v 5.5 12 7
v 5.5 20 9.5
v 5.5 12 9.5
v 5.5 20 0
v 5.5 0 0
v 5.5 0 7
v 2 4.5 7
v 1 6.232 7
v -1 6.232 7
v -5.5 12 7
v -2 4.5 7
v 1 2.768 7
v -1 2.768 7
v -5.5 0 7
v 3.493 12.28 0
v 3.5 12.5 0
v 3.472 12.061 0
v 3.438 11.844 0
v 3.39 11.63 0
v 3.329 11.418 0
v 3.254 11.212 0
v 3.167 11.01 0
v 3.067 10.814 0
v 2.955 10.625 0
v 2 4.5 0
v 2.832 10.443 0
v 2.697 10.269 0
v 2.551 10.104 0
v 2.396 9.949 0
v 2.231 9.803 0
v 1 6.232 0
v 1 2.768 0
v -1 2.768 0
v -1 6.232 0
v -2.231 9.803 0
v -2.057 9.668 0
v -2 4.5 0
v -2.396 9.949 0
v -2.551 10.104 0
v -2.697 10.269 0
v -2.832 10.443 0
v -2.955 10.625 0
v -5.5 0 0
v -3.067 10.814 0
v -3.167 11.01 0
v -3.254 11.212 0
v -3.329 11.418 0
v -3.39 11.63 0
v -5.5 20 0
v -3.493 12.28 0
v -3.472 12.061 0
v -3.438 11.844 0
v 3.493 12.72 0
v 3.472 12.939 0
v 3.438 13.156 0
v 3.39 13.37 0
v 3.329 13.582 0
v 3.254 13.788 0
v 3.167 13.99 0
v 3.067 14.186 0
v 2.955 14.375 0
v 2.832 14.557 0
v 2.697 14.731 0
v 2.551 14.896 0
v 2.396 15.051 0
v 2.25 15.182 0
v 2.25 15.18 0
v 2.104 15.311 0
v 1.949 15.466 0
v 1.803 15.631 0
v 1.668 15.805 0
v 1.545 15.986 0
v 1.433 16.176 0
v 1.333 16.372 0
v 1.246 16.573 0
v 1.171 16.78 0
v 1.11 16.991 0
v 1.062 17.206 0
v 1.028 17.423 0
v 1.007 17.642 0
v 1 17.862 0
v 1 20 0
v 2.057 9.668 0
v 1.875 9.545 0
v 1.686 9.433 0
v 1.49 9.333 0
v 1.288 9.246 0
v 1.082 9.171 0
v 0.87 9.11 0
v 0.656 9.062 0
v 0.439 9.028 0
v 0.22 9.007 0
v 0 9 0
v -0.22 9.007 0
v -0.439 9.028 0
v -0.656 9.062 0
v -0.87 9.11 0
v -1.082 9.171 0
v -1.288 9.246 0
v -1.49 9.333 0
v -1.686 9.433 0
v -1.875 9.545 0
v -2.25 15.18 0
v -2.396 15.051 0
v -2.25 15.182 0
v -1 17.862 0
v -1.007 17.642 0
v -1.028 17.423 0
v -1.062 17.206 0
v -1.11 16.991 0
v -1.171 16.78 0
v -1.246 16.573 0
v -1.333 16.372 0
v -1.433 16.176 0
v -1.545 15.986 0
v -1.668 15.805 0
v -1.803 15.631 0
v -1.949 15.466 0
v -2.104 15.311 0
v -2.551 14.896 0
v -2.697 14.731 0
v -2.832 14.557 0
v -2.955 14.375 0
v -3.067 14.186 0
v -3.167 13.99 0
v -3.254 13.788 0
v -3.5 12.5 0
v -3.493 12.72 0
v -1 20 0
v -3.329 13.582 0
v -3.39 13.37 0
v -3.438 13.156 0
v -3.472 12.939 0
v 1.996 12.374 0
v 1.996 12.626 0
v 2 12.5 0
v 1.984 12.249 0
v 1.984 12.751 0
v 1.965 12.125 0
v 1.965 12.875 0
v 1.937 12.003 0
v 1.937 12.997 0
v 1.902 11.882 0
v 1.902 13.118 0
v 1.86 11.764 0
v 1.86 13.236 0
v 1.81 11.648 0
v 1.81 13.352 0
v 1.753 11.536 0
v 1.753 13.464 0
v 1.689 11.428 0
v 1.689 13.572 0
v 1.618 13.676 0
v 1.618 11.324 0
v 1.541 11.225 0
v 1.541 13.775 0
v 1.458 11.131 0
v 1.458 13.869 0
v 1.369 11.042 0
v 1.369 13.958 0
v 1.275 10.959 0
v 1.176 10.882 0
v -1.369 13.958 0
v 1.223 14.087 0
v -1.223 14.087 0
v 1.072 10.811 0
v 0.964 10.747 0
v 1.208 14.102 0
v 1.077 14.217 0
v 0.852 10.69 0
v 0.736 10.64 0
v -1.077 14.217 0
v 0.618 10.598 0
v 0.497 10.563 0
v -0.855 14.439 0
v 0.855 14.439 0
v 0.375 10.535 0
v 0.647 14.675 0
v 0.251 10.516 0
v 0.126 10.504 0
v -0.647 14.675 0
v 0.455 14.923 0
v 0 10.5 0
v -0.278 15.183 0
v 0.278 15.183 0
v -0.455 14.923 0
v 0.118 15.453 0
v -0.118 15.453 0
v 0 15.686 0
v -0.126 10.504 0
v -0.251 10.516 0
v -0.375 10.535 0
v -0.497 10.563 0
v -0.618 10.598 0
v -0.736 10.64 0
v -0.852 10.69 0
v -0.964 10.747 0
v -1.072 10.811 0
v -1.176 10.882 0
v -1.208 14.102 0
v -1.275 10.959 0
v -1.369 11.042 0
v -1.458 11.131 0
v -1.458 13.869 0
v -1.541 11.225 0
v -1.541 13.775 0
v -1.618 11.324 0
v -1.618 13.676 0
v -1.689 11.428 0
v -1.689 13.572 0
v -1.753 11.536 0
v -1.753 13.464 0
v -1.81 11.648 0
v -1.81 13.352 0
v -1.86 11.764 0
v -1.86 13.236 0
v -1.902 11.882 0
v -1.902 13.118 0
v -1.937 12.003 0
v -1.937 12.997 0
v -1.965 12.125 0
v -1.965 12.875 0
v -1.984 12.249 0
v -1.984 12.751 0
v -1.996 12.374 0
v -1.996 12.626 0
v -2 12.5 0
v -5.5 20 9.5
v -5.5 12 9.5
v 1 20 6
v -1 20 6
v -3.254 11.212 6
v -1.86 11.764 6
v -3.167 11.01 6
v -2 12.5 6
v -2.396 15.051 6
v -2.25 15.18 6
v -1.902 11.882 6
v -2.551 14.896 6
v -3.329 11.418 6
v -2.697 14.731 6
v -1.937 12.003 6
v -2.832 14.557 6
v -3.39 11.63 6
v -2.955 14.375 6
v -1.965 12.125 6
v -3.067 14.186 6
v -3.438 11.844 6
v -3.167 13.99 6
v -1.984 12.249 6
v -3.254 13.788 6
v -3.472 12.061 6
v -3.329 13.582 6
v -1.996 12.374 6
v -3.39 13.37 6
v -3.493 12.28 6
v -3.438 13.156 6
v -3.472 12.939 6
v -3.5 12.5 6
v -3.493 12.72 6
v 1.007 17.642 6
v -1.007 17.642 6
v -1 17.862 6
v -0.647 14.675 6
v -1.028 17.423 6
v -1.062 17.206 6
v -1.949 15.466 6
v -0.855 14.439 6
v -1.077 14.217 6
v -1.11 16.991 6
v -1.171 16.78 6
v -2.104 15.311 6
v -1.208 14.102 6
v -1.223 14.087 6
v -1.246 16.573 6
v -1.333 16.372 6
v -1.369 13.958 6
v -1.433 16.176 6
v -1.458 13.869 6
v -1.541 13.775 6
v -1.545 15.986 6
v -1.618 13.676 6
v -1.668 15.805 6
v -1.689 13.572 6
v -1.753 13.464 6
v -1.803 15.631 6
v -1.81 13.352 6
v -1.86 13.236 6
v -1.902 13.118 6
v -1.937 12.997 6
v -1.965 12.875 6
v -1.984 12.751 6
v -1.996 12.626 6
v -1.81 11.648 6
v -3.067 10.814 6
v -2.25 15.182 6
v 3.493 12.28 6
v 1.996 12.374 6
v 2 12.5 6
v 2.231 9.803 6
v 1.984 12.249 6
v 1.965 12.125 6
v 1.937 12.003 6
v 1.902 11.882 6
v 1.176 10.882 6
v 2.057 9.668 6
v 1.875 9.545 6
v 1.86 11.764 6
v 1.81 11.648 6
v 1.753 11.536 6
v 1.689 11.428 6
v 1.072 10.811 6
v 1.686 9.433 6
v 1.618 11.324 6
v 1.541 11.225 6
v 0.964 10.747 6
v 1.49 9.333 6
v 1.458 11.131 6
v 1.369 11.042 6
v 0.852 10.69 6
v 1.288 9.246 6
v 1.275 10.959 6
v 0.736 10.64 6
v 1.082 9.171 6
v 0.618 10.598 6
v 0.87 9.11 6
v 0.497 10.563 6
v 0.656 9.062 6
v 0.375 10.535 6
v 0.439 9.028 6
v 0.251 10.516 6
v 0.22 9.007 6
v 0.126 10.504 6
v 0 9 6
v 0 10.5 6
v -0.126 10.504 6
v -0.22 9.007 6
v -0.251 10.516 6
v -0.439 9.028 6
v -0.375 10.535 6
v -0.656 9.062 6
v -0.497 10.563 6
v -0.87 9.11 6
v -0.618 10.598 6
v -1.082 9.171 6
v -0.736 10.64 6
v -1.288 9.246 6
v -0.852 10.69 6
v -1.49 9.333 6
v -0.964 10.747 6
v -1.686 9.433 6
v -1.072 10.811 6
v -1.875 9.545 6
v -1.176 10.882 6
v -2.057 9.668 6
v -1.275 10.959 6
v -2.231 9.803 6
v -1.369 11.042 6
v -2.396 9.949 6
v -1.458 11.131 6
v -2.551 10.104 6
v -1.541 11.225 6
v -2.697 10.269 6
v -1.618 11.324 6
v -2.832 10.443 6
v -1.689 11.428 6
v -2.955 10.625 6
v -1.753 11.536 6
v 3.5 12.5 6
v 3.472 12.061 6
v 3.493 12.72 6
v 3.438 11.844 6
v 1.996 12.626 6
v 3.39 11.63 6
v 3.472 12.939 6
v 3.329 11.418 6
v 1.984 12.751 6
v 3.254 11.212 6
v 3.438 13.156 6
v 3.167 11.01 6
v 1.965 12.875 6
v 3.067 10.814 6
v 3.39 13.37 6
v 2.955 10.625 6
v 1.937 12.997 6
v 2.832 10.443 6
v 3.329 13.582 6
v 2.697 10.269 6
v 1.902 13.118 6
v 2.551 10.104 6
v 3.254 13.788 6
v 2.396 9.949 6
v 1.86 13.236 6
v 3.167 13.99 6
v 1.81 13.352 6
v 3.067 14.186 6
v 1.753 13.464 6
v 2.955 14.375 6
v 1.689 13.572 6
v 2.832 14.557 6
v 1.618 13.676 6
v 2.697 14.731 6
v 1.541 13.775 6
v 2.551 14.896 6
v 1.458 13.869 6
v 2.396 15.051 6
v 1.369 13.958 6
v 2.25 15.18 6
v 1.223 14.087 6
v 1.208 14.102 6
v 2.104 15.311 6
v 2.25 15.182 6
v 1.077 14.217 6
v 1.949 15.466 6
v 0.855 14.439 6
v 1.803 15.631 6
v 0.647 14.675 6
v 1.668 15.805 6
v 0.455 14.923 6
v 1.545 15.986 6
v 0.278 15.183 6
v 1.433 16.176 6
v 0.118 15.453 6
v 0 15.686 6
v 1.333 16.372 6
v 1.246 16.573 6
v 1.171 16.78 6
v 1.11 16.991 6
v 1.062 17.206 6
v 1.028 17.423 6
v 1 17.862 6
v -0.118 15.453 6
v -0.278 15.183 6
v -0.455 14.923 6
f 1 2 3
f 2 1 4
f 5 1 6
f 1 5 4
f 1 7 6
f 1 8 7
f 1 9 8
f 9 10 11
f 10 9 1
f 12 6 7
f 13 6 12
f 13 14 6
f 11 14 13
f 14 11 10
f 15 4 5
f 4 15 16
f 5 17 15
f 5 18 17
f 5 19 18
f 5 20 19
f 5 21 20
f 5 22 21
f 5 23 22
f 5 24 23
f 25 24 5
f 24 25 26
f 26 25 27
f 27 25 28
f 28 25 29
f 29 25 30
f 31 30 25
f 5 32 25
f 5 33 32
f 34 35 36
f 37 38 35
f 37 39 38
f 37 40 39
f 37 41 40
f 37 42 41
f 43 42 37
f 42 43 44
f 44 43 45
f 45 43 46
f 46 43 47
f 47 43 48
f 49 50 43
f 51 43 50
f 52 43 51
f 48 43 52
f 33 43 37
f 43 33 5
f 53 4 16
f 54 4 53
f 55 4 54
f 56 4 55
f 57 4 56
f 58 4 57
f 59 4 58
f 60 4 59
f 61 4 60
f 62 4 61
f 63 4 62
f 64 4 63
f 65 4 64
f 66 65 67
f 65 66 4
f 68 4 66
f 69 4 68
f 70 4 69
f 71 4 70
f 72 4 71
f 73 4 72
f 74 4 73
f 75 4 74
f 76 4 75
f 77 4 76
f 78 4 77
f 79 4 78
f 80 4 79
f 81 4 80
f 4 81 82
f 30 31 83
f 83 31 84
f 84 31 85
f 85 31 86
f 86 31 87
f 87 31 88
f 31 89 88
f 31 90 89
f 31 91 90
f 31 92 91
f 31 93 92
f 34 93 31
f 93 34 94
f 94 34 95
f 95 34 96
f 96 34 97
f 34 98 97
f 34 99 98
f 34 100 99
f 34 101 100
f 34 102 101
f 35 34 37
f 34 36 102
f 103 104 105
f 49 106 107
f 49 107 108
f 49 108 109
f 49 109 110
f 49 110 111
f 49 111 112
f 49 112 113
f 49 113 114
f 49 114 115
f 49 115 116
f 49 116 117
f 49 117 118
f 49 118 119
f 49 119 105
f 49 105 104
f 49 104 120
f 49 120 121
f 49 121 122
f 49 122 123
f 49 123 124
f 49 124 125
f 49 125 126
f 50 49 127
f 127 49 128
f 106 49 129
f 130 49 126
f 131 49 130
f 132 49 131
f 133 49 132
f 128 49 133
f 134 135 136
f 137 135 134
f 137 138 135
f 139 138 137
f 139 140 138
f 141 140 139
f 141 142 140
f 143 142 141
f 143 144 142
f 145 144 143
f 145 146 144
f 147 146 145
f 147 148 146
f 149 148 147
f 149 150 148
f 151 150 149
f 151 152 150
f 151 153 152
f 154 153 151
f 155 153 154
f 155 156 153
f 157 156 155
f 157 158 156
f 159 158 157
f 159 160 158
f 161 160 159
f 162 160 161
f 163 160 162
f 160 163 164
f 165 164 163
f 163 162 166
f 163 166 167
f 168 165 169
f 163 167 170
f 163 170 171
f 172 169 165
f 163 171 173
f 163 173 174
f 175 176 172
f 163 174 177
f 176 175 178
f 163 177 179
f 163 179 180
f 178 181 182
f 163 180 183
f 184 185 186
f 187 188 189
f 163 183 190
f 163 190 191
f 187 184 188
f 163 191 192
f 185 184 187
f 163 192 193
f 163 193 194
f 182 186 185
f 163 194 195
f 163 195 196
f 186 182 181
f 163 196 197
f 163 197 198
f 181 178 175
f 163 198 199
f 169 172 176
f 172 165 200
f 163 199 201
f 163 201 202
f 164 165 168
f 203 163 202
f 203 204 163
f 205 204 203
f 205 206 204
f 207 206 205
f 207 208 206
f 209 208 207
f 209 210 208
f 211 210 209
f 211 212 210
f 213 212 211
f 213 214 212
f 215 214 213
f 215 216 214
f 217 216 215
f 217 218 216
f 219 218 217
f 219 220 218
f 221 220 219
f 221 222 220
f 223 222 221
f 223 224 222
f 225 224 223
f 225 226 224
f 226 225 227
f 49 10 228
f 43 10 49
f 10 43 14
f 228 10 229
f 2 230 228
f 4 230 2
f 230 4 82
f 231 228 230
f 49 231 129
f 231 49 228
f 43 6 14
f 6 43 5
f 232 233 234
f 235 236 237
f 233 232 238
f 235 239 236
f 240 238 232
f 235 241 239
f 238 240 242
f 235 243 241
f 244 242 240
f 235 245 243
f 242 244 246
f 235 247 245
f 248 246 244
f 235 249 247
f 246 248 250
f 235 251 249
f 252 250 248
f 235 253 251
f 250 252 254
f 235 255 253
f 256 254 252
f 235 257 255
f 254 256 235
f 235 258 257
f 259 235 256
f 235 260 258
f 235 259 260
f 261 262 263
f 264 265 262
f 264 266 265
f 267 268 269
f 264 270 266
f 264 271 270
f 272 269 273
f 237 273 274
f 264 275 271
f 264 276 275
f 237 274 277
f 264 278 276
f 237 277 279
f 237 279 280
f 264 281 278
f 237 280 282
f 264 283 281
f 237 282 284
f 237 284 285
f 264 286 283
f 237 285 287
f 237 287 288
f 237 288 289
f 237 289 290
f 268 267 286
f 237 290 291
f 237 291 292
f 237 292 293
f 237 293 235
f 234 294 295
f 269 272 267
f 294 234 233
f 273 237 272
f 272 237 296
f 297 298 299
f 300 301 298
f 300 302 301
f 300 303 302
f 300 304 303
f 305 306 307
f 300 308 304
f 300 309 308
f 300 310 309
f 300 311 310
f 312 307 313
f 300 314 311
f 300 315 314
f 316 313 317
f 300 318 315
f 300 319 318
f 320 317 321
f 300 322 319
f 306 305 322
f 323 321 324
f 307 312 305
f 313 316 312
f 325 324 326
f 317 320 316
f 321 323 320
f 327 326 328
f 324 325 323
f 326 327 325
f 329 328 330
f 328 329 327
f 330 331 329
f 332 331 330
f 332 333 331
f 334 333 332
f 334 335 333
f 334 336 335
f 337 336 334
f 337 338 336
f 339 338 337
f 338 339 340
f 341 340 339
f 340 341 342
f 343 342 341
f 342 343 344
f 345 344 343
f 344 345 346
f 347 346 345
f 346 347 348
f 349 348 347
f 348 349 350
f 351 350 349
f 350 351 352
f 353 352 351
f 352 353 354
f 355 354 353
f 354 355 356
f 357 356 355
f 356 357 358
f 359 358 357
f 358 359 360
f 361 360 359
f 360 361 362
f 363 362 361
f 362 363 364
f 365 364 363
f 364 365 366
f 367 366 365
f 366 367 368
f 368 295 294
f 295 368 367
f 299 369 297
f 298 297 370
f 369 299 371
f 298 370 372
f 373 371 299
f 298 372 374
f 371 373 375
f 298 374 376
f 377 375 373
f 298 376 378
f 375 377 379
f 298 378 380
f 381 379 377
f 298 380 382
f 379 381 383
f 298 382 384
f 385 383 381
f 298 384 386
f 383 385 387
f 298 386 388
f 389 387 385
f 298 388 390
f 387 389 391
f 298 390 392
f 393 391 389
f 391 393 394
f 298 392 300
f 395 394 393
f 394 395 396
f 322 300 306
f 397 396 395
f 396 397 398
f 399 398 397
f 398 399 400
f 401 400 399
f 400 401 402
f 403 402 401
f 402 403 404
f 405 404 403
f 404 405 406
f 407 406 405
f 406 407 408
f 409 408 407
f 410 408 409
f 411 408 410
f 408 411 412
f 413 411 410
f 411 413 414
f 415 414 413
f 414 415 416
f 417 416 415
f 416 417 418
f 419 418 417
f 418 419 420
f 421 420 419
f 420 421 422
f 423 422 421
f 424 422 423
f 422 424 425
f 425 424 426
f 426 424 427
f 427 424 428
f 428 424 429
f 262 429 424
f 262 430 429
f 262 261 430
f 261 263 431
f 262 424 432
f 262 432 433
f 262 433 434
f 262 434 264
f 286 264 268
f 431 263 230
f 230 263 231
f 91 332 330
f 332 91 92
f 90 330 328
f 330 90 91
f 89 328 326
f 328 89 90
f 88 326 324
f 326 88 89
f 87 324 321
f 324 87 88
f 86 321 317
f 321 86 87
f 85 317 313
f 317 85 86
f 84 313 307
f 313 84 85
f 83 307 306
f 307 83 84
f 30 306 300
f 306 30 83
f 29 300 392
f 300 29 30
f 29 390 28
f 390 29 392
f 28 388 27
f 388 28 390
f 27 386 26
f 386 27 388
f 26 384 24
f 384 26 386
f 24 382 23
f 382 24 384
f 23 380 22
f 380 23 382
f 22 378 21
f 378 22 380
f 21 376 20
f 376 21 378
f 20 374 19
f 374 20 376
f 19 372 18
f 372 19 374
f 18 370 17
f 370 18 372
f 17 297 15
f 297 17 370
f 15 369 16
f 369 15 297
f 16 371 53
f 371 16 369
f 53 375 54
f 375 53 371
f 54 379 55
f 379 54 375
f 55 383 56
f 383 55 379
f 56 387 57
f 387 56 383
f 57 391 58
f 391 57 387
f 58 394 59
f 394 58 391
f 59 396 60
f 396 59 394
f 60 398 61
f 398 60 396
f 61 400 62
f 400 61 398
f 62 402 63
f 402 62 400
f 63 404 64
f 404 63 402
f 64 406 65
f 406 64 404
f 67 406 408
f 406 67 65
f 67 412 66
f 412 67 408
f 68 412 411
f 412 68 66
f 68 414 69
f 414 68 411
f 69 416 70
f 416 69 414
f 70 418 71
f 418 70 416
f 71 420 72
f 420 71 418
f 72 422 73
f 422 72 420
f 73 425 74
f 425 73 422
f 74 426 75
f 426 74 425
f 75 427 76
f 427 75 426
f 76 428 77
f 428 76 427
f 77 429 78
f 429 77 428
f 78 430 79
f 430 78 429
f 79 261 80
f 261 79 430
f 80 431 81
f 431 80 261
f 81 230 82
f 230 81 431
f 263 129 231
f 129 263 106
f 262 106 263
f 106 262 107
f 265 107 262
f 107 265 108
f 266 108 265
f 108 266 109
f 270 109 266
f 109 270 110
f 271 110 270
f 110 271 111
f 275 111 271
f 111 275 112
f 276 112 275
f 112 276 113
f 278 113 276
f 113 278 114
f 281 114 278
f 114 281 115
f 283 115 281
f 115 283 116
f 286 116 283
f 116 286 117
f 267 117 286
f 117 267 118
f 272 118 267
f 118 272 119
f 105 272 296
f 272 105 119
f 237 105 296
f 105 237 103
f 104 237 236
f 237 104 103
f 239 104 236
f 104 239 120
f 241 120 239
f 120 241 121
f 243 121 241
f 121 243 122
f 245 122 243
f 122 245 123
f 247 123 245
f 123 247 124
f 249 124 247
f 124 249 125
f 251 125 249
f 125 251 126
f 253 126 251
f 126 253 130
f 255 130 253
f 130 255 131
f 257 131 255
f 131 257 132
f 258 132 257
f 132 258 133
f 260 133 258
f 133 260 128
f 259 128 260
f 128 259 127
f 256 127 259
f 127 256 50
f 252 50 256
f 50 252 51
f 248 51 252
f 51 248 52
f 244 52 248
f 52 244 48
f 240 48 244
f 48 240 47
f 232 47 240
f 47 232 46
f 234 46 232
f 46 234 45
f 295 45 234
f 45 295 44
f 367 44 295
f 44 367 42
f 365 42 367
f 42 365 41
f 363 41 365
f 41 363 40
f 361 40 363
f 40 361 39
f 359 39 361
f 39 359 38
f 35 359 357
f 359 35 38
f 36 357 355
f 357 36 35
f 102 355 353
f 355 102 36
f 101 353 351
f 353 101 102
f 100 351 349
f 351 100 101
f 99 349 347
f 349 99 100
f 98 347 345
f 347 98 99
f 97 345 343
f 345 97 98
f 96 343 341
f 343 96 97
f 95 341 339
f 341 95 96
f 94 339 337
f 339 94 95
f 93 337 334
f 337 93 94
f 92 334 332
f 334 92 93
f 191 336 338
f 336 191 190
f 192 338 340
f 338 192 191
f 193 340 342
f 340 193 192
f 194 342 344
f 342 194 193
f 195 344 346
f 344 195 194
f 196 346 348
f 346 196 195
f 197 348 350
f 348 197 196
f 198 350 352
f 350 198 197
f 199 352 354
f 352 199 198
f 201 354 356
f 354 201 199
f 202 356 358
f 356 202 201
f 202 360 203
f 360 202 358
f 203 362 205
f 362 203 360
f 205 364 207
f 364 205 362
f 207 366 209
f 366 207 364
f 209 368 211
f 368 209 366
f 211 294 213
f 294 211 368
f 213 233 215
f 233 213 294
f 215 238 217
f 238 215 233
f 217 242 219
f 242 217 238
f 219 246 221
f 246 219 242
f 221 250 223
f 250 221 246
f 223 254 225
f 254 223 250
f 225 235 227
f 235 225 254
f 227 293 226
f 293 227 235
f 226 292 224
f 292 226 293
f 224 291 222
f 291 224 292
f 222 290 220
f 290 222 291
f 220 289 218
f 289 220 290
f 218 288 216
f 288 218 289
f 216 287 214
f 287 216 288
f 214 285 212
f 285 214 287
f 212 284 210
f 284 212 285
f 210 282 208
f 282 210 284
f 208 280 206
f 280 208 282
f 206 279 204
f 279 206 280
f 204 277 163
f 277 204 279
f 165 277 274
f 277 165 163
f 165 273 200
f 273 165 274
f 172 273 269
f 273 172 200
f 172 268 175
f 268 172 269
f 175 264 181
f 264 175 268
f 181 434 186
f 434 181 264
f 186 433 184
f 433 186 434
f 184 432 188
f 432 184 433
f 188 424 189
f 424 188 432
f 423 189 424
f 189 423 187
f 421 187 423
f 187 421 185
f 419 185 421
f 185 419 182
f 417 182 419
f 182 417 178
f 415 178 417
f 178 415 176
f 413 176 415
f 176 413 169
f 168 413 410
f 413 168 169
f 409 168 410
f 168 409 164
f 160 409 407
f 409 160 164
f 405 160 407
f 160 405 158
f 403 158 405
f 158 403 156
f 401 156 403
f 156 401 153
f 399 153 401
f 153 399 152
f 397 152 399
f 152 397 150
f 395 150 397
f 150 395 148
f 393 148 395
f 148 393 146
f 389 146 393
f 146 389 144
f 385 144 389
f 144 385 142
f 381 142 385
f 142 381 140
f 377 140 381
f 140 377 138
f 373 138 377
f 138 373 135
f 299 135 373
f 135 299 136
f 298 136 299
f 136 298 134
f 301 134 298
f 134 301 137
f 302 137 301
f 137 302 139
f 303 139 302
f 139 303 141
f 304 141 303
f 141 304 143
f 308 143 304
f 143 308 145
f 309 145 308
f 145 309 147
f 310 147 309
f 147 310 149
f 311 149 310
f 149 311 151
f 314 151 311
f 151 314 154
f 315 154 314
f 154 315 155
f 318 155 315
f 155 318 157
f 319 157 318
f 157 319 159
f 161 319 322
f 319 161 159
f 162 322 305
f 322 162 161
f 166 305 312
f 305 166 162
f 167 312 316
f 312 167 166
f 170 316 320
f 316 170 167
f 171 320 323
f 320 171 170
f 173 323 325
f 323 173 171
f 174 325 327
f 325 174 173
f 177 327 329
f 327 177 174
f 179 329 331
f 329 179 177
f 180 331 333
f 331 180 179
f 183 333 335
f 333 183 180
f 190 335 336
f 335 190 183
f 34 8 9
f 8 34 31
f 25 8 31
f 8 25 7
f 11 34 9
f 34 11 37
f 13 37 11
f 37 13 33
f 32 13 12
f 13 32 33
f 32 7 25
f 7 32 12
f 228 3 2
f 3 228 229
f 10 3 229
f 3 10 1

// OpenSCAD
$fn=100;

width=11;
length=20;

belt_thickness=1.5; // 1.38
merged_belt_thickness=2;
belt_width=6;
circle_d=7;

main(7, 2.5);
//main(8, 8.5);

module main(height1, height2) {
    difference() {
        translate([-width/2, 0, 0]) cube([width, length, height1]);
        translate([0, 12.5, 0]) belt();
        translate([0, 4.5, 0]) cylinder(d=4, h=99, $fn=6);
    }
    translate([-width/2, length-8, height1]) cube([width, 8, height2]);
}


module belt() {
    magic_width=circle_d/2+merged_belt_thickness/2;
    magic_height=sqrt(pow(circle_d, 2)-pow(magic_width, 2));
    linear_extrude(height=belt_width) shell(-1.5) {
        difference() {
            union() {
                circle(d=circle_d);
                translate([-(magic_width)/2, 0]) square([magic_width, magic_height]);
            }
            translate([magic_width, magic_height]) circle(d=circle_d);
            mirror([1, 0]) translate([magic_width, magic_height]) circle(d=circle_d);
        }
        translate([-merged_belt_thickness/2, 0]) square([merged_belt_thickness, 10]);
    }
}


// Copyright (c) 2013 Oskar Linde. All rights reserved.
// License: BSD
//
// This library contains basic 2D morphology operations
//
// outset(d=1)            - creates a polygon at an offset d outside a 2D shape
// inset(d=1)             - creates a polygon at an offset d inside a 2D shape
// fillet(r=1)            - adds fillets of radius r to all concave corners of a 2D shape
// rounding(r=1)          - adds rounding to all convex corners of a 2D shape
// shell(d,center=false)  - makes a shell of width d along the edge of a 2D shape
//                        - positive values of d places the shell on the outside
//                        - negative values of d places the shell on the inside
//                        - center=true and positive d places the shell centered on the edge

module outset(d=1) {
	// Bug workaround for older OpenSCAD versions
	if (version_num() < 20130424) render() outset_extruded(d) children();
	else minkowski() {
		circle(r=d);
		children();
	}
}

module outset_extruded(d=1) {
   projection(cut=true) minkowski() {
        cylinder(r=d);
        linear_extrude(center=true) children();
   }
}

module inset(d=1) {
	 render() inverse() outset(d=d) inverse() children();
}

module fillet(r=1) {
	inset(d=r) render() outset(d=r) children();
}

module rounding(r=1) {
	outset(d=r) inset(d=r) children();
}

module shell(d,center=false) {
	if (center && d > 0) {
		difference() {
			outset(d=d/2) children();
			inset(d=d/2) children();
		}
	}
	if (!center && d > 0) {
		difference() {
			outset(d=d) children();
			children();
		}
	}
	if (!center && d < 0) {
		difference() {
			children();
			inset(d=-d) children();
		}
	}
	if (d == 0) children();
}


// Below are for internal use only

module inverse() {
	difference() {
		square(1e5,center=true);
		children();
	}
}
